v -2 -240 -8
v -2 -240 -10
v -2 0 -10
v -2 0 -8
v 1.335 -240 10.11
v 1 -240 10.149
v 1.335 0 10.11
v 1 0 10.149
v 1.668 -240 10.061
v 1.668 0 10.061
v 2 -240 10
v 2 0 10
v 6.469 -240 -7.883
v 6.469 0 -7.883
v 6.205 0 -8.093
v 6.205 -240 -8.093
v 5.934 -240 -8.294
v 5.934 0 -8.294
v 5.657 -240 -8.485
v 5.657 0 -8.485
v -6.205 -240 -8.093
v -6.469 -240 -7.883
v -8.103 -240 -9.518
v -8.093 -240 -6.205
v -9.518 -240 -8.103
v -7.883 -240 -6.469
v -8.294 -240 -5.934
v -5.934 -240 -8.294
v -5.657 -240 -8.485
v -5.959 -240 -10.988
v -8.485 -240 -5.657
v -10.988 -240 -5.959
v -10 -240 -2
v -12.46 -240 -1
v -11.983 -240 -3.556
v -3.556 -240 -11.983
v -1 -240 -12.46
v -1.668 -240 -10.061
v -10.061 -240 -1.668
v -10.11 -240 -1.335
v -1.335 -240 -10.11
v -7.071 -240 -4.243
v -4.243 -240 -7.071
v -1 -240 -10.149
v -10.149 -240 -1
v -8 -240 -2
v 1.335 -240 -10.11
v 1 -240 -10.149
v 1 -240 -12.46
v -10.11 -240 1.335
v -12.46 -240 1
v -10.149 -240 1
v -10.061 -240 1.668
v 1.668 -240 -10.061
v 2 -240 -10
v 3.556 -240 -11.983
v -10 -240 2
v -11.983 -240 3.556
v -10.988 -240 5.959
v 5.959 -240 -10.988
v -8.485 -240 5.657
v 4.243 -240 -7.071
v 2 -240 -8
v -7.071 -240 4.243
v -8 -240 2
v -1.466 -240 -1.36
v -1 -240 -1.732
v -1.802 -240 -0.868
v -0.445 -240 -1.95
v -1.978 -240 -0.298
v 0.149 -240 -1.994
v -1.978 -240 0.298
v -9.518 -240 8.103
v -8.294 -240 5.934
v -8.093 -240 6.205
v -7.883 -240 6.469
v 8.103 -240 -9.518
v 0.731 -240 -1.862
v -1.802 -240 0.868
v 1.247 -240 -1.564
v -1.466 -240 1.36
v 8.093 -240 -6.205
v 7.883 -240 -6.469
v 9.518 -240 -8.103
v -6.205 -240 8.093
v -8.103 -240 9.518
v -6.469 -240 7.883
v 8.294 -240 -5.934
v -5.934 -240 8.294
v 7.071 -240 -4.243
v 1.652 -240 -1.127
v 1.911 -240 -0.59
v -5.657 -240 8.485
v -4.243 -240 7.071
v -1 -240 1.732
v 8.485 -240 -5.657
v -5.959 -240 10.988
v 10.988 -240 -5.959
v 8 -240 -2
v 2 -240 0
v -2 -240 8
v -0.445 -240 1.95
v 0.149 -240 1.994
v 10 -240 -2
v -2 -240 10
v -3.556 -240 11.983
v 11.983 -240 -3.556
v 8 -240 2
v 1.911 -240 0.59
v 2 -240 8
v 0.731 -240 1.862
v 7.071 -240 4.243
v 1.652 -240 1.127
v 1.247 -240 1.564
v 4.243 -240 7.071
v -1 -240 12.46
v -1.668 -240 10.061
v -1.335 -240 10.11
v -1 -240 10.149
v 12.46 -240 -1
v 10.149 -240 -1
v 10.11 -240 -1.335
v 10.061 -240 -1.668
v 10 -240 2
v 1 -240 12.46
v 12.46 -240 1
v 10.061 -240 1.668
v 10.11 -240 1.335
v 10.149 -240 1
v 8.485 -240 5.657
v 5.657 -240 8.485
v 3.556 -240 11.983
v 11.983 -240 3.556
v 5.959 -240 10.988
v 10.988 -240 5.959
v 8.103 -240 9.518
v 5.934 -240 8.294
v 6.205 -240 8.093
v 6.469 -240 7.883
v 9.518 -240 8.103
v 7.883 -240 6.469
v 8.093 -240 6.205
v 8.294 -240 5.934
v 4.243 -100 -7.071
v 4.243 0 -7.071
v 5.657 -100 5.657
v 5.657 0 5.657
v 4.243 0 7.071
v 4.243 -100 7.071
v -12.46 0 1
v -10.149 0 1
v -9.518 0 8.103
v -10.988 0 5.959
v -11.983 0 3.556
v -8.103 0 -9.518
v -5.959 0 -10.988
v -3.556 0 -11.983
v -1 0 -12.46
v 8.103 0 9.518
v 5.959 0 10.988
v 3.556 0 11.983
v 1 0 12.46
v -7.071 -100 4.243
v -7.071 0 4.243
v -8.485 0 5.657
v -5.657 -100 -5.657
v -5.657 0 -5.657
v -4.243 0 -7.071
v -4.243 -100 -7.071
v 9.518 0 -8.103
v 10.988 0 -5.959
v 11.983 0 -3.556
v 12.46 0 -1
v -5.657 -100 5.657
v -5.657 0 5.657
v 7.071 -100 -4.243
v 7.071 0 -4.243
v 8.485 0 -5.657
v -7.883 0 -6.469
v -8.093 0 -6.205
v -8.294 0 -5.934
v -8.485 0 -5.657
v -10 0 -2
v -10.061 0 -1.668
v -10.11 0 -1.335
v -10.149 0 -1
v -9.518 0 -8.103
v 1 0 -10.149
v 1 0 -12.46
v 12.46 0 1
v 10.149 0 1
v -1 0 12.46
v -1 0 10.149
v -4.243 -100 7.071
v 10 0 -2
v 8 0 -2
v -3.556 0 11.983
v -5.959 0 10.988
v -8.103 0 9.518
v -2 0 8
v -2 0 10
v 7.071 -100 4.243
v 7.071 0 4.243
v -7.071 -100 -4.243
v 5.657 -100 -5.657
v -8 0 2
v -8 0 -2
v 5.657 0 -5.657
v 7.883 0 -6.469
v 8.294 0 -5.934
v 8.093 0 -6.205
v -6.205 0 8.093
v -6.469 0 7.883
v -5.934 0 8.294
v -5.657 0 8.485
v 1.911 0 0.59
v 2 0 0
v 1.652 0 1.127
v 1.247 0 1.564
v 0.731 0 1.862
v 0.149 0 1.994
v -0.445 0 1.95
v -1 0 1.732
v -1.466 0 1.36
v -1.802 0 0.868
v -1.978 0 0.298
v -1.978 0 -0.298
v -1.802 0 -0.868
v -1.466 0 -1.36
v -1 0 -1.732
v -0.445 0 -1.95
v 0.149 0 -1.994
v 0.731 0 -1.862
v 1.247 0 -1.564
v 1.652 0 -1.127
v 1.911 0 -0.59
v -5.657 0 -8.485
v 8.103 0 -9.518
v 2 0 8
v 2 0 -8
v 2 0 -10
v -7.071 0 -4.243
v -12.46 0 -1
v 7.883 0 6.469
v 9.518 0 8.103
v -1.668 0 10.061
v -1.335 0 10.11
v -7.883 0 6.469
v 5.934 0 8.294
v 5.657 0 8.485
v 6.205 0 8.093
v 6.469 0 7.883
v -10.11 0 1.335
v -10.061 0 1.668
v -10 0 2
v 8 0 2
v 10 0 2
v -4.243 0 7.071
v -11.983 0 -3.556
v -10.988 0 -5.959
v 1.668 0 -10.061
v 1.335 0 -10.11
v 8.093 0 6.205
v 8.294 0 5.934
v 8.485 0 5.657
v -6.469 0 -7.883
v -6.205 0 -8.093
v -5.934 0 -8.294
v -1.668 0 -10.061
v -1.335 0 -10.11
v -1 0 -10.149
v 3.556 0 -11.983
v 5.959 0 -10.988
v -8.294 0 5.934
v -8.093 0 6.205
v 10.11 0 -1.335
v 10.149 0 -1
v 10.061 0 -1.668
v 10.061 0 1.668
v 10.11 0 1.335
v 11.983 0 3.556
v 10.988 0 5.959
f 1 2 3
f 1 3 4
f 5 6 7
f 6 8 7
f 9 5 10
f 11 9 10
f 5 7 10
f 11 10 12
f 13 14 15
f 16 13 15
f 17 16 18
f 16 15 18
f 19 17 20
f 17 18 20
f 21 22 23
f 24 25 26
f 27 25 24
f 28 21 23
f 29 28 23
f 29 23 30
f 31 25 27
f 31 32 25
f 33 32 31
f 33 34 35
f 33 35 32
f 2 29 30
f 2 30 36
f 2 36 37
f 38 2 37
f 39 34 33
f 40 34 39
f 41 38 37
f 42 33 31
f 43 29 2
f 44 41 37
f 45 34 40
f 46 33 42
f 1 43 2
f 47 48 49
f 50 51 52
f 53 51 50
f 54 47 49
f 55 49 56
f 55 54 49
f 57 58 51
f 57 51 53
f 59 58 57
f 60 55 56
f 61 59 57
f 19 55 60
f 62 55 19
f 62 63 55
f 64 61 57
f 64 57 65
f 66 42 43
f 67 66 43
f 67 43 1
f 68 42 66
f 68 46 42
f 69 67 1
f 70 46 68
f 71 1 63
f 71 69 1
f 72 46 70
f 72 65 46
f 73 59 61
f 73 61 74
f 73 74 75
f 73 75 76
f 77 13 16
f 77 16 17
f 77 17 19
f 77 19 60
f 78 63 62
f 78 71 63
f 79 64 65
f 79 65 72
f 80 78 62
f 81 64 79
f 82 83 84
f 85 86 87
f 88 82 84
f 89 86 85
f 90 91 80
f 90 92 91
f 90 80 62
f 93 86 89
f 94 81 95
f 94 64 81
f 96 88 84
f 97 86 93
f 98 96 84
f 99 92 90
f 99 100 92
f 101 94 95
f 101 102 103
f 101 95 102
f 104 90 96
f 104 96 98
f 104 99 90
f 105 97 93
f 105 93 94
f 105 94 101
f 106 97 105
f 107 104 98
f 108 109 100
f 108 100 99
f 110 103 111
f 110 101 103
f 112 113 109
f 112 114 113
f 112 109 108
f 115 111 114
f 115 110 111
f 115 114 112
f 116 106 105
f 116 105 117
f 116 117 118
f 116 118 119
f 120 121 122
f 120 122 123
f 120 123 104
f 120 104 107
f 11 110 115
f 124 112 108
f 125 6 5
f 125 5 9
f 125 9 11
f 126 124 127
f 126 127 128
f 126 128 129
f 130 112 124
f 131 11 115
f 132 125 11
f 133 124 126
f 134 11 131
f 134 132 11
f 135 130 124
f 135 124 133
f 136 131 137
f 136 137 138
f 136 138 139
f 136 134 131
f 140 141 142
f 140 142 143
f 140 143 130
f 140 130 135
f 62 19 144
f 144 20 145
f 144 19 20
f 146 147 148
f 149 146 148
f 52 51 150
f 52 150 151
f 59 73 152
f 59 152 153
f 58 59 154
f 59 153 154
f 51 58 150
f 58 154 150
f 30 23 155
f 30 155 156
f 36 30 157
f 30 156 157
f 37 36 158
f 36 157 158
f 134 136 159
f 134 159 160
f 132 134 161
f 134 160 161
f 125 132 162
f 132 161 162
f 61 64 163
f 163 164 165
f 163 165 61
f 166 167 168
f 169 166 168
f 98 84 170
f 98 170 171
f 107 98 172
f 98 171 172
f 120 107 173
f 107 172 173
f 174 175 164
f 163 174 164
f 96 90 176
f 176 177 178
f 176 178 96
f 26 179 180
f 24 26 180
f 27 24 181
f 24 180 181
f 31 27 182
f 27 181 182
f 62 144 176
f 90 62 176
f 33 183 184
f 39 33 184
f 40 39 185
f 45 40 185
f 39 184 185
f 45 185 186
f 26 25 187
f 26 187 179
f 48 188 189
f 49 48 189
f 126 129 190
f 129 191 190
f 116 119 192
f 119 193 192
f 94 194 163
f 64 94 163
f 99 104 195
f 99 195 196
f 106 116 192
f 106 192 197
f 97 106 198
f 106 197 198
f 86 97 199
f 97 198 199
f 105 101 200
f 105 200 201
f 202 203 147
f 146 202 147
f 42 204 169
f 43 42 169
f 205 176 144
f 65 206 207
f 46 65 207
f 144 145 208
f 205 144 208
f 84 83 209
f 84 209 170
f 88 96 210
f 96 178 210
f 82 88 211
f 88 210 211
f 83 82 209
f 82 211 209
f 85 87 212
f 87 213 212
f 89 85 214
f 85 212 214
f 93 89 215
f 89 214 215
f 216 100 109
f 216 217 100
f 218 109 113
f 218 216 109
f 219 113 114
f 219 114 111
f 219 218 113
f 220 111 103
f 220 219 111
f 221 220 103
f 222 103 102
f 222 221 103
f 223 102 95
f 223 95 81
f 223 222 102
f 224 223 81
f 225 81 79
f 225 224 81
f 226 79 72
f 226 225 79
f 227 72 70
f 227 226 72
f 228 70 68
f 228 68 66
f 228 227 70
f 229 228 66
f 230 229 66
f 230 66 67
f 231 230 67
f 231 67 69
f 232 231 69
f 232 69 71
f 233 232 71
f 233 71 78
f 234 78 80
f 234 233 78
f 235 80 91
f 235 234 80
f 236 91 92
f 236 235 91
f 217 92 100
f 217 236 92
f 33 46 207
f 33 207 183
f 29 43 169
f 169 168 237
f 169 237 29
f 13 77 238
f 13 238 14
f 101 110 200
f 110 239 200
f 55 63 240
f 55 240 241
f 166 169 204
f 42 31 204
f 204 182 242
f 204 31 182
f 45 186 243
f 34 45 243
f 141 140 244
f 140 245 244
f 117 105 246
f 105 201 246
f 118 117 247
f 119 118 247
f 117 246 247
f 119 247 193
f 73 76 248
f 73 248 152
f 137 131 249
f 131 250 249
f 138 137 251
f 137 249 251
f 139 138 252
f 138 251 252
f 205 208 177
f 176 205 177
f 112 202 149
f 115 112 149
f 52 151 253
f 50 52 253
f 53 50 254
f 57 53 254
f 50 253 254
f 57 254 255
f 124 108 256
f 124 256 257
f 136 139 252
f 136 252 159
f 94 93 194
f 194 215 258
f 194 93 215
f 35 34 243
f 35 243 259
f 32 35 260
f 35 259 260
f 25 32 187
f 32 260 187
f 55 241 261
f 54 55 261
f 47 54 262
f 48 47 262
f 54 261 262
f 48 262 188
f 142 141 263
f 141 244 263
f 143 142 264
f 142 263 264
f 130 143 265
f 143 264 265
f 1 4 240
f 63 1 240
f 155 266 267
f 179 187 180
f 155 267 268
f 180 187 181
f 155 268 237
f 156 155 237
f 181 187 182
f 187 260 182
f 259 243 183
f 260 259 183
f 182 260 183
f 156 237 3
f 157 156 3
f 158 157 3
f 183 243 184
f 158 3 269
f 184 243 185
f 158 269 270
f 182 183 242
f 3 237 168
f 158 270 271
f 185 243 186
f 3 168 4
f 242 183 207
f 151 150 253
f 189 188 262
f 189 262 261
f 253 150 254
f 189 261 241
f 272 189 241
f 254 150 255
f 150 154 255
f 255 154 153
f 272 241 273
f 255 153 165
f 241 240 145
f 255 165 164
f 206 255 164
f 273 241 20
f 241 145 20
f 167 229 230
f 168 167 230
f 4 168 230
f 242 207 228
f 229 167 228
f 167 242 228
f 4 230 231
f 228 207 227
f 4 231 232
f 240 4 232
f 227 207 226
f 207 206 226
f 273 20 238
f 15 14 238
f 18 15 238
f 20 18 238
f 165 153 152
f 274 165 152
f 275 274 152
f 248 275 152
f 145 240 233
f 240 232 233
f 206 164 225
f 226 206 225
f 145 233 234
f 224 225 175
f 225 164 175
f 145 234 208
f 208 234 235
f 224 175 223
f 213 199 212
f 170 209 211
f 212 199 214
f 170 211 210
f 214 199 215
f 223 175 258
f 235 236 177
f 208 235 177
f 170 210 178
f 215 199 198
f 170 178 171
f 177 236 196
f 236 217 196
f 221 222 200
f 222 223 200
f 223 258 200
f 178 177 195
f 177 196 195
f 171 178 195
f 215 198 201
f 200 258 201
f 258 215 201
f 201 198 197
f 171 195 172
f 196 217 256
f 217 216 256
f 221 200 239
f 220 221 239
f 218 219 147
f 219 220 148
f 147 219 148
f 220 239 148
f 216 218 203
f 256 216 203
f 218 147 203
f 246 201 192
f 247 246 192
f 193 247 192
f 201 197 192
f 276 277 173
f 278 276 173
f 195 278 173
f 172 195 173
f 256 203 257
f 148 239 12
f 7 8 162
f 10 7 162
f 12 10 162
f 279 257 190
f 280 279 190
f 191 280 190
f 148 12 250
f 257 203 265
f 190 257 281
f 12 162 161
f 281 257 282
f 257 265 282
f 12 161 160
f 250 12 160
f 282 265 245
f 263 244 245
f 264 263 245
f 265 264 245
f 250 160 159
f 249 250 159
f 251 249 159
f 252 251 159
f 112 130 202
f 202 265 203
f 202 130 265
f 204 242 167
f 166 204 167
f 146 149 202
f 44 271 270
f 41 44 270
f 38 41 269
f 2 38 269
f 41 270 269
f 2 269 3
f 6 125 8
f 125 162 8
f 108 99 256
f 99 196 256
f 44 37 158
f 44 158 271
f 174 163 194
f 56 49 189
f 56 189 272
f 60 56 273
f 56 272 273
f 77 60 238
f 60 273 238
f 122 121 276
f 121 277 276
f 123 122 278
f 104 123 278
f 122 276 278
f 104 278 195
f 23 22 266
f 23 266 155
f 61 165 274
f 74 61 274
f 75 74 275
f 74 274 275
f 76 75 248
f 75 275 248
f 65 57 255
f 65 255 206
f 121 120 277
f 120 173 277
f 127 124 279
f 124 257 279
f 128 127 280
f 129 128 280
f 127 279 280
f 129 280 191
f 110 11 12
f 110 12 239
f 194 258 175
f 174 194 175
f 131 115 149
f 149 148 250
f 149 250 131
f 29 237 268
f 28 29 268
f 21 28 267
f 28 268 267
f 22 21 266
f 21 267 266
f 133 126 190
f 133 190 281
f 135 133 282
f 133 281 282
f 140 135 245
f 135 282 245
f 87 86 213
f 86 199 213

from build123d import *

# Parameters (mm, degrees)
F0_R      = 2
F1_DEPTH  = 100
F1_FACE_R = 2
F2_DEPTH  = 140


with BuildPart() as f1:
    # F0 (on Front) → F1 (new body)
    with BuildSketch(Plane.XZ):
        with BuildLine():
            Line((8, -2), (8, 0))
            Line((8, 0), (8, 2))
            Line((8, 2), (10, 2))
            ThreePointArc((10, 2), (10.086846, 1.501846), (10.148892, 1))
            Line((10.148892, 1), (12.459936, 1))
            ThreePointArc((12.459936, 1), (11.548494, 4.783543), (9.517612, 8.103398))
            Line((9.517612, 8.103398), (7.883457, 6.469243))
            ThreePointArc((7.883457, 6.469243), (8.194443, 6.070511), (8.485281, 5.656854))
            Line((8.485281, 5.656854), (7.071068, 4.242641))
            Line((7.071068, 4.242641), (5.656854, 5.656854))
            Line((5.656854, 5.656854), (4.242641, 7.071068))
            Line((4.242641, 7.071068), (5.656854, 8.485281))
            ThreePointArc((5.656854, 8.485281), (6.070511, 8.194443), (6.469243, 7.883457))
            Line((6.469243, 7.883457), (8.103398, 9.517612))
            ThreePointArc((8.103398, 9.517612), (4.783543, 11.548494), (1, 12.459936))
            Line((1, 12.459936), (1, 10.148892))
            ThreePointArc((1, 10.148892), (1.501846, 10.086846), (2, 10))
            Line((2, 10), (2, 8))
            Line((2, 8), (0, 8))
            Line((0, 8), (-2, 8))
            Line((-2, 8), (-2, 10))
            ThreePointArc((-2, 10), (-1.501846, 10.086846), (-1, 10.148892))
            Line((-1, 10.148892), (-1, 12.459936))
            ThreePointArc((-1, 12.459936), (-4.783543, 11.548494), (-8.103398, 9.517612))
            Line((-8.103398, 9.517612), (-6.469243, 7.883457))
            ThreePointArc((-6.469243, 7.883457), (-6.070511, 8.194443), (-5.656854, 8.485281))
            Line((-5.656854, 8.485281), (-4.242641, 7.071068))
            Line((-4.242641, 7.071068), (-5.656854, 5.656854))
            Line((-5.656854, 5.656854), (-7.071068, 4.242641))
            Line((-7.071068, 4.242641), (-8.485281, 5.656854))
            ThreePointArc((-8.485281, 5.656854), (-8.194443, 6.070511), (-7.883457, 6.469243))
            Line((-7.883457, 6.469243), (-9.517612, 8.103398))
            ThreePointArc((-9.517612, 8.103398), (-11.548494, 4.783543), (-12.459936, 1))
            Line((-12.459936, 1), (-10.148892, 1))
            ThreePointArc((-10.148892, 1), (-10.086846, 1.501846), (-10, 2))
            Line((-10, 2), (-8, 2))
            Line((-8, 2), (-8, 0))
            Line((-8, 0), (-8, -2))
            Line((-8, -2), (-10, -2))
            ThreePointArc((-10, -2), (-10.086846, -1.501846), (-10.148892, -1))
            Line((-10.148892, -1), (-12.459936, -1))
            ThreePointArc((-12.459936, -1), (-11.548494, -4.783543), (-9.517612, -8.103398))
            Line((-9.517612, -8.103398), (-7.883457, -6.469243))
            ThreePointArc((-7.883457, -6.469243), (-8.194443, -6.070511), (-8.485281, -5.656854))
            Line((-8.485281, -5.656854), (-7.071068, -4.242641))
            Line((-7.071068, -4.242641), (-5.656854, -5.656854))
            Line((-5.656854, -5.656854), (-4.242641, -7.071068))
            Line((-4.242641, -7.071068), (-5.656854, -8.485281))
            ThreePointArc((-5.656854, -8.485281), (-6.070511, -8.194443), (-6.469243, -7.883457))
            Line((-6.469243, -7.883457), (-8.103398, -9.517612))
            ThreePointArc((-8.103398, -9.517612), (-4.783543, -11.548494), (-1, -12.459936))
            Line((-1, -12.459936), (-1, -10.148892))
            ThreePointArc((-1, -10.148892), (-1.501846, -10.086846), (-2, -10))
            Line((-2, -10), (-2, -8))
            Line((-2, -8), (0, -8))
            Line((0, -8), (2, -8))
            Line((2, -8), (2, -10))
            ThreePointArc((2, -10), (1.501846, -10.086846), (1, -10.148892))
            Line((1, -10.148892), (1, -12.459936))
            ThreePointArc((1, -12.459936), (4.783543, -11.548494), (8.103398, -9.517612))
            Line((8.103398, -9.517612), (6.469243, -7.883457))
            ThreePointArc((6.469243, -7.883457), (6.070511, -8.194443), (5.656854, -8.485281))
            Line((5.656854, -8.485281), (4.242641, -7.071068))
            Line((4.242641, -7.071068), (5.656854, -5.656854))
            Line((5.656854, -5.656854), (7.071068, -4.242641))
            Line((7.071068, -4.242641), (8.485281, -5.656854))
            ThreePointArc((8.485281, -5.656854), (8.194443, -6.070511), (7.883457, -6.469243))
            Line((7.883457, -6.469243), (9.517612, -8.103398))
            ThreePointArc((9.517612, -8.103398), (11.548494, -4.783543), (12.459936, -1))
            Line((12.459936, -1), (10.148892, -1))
            ThreePointArc((10.148892, -1), (10.086846, -1.501846), (10, -2))
            Line((10, -2), (8, -2))
        make_face()
        Circle(F0_R, mode=Mode.SUBTRACT)
    extrude(amount=F1_DEPTH)

    # F1_face (on face) → F2 (join)
    with BuildSketch(Plane.XZ.offset(100)):
        with BuildLine():
            ThreePointArc((6.469243, -7.883457), (6.070511, -8.194443), (5.656854, -8.485281))
            Line((5.656854, -8.485281), (4.242641, -7.071068))
            Line((4.242641, -7.071068), (7.071068, -4.242641))
            Line((7.071068, -4.242641), (8.485281, -5.656854))
            ThreePointArc((8.485281, -5.656854), (8.194443, -6.070511), (7.883457, -6.469243))
            Line((7.883457, -6.469243), (9.517612, -8.103398))
            ThreePointArc((9.517612, -8.103398), (11.548494, -4.783543), (12.459936, -1))
            Line((12.459936, -1), (10.148892, -1))
            ThreePointArc((10.148892, -1), (10.086846, -1.501846), (10, -2))
            Line((10, -2), (8, -2))
            Line((8, -2), (8, 2))
            Line((8, 2), (10, 2))
            ThreePointArc((10, 2), (10.086846, 1.501846), (10.148892, 1))
            Line((10.148892, 1), (12.459936, 1))
            ThreePointArc((12.459936, 1), (11.548494, 4.783543), (9.517612, 8.103398))
            Line((9.517612, 8.103398), (7.883457, 6.469243))
            ThreePointArc((7.883457, 6.469243), (8.194443, 6.070511), (8.485281, 5.656854))
            Line((8.485281, 5.656854), (7.071068, 4.242641))
            Line((7.071068, 4.242641), (4.242641, 7.071068))
            Line((4.242641, 7.071068), (5.656854, 8.485281))
            ThreePointArc((5.656854, 8.485281), (6.070511, 8.194443), (6.469243, 7.883457))
            Line((6.469243, 7.883457), (8.103398, 9.517612))
            ThreePointArc((8.103398, 9.517612), (4.783543, 11.548494), (1, 12.459936))
            Line((1, 12.459936), (1, 10.148892))
            ThreePointArc((1, 10.148892), (1.501846, 10.086846), (2, 10))
            Line((2, 10), (2, 8))
            Line((2, 8), (-2, 8))
            Line((-2, 8), (-2, 10))
            ThreePointArc((-2, 10), (-1.501846, 10.086846), (-1, 10.148892))
            Line((-1, 10.148892), (-1, 12.459936))
            ThreePointArc((-1, 12.459936), (-4.783543, 11.548494), (-8.103398, 9.517612))
            Line((-8.103398, 9.517612), (-6.469243, 7.883457))
            ThreePointArc((-6.469243, 7.883457), (-6.070511, 8.194443), (-5.656854, 8.485281))
            Line((-5.656854, 8.485281), (-4.242641, 7.071068))
            Line((-4.242641, 7.071068), (-7.071068, 4.242641))
            Line((-7.071068, 4.242641), (-8.485281, 5.656854))
            ThreePointArc((-8.485281, 5.656854), (-8.194443, 6.070511), (-7.883457, 6.469243))
            Line((-7.883457, 6.469243), (-9.517612, 8.103398))
            ThreePointArc((-9.517612, 8.103398), (-11.548494, 4.783543), (-12.459936, 1))
            Line((-12.459936, 1), (-10.148892, 1))
            ThreePointArc((-10.148892, 1), (-10.086846, 1.501846), (-10, 2))
            Line((-10, 2), (-8, 2))
            Line((-8, 2), (-8, -2))
            Line((-8, -2), (-10, -2))
            ThreePointArc((-10, -2), (-10.086846, -1.501846), (-10.148892, -1))
            Line((-10.148892, -1), (-12.459936, -1))
            ThreePointArc((-12.459936, -1), (-11.548494, -4.783543), (-9.517612, -8.103398))
            Line((-9.517612, -8.103398), (-7.883457, -6.469243))
            ThreePointArc((-7.883457, -6.469243), (-8.194443, -6.070511), (-8.485281, -5.656854))
            Line((-8.485281, -5.656854), (-7.071068, -4.242641))
            Line((-7.071068, -4.242641), (-4.242641, -7.071068))
            Line((-4.242641, -7.071068), (-5.656854, -8.485281))
            ThreePointArc((-5.656854, -8.485281), (-6.070511, -8.194443), (-6.469243, -7.883457))
            Line((-6.469243, -7.883457), (-8.103398, -9.517612))
            ThreePointArc((-8.103398, -9.517612), (-4.783543, -11.548494), (-1, -12.459936))
            Line((-1, -12.459936), (-1, -10.148892))
            ThreePointArc((-1, -10.148892), (-1.501846, -10.086846), (-2, -10))
            Line((-2, -10), (-2, -8))
            Line((-2, -8), (2, -8))
            Line((2, -8), (2, -10))
            ThreePointArc((2, -10), (1.501846, -10.086846), (1, -10.148892))
            Line((1, -10.148892), (1, -12.459936))
            ThreePointArc((1, -12.459936), (4.783543, -11.548494), (8.103398, -9.517612))
            Line((8.103398, -9.517612), (6.469243, -7.883457))
        make_face()
        Circle(F1_FACE_R, mode=Mode.SUBTRACT)
    extrude(amount=F2_DEPTH)


solid = f1.part
